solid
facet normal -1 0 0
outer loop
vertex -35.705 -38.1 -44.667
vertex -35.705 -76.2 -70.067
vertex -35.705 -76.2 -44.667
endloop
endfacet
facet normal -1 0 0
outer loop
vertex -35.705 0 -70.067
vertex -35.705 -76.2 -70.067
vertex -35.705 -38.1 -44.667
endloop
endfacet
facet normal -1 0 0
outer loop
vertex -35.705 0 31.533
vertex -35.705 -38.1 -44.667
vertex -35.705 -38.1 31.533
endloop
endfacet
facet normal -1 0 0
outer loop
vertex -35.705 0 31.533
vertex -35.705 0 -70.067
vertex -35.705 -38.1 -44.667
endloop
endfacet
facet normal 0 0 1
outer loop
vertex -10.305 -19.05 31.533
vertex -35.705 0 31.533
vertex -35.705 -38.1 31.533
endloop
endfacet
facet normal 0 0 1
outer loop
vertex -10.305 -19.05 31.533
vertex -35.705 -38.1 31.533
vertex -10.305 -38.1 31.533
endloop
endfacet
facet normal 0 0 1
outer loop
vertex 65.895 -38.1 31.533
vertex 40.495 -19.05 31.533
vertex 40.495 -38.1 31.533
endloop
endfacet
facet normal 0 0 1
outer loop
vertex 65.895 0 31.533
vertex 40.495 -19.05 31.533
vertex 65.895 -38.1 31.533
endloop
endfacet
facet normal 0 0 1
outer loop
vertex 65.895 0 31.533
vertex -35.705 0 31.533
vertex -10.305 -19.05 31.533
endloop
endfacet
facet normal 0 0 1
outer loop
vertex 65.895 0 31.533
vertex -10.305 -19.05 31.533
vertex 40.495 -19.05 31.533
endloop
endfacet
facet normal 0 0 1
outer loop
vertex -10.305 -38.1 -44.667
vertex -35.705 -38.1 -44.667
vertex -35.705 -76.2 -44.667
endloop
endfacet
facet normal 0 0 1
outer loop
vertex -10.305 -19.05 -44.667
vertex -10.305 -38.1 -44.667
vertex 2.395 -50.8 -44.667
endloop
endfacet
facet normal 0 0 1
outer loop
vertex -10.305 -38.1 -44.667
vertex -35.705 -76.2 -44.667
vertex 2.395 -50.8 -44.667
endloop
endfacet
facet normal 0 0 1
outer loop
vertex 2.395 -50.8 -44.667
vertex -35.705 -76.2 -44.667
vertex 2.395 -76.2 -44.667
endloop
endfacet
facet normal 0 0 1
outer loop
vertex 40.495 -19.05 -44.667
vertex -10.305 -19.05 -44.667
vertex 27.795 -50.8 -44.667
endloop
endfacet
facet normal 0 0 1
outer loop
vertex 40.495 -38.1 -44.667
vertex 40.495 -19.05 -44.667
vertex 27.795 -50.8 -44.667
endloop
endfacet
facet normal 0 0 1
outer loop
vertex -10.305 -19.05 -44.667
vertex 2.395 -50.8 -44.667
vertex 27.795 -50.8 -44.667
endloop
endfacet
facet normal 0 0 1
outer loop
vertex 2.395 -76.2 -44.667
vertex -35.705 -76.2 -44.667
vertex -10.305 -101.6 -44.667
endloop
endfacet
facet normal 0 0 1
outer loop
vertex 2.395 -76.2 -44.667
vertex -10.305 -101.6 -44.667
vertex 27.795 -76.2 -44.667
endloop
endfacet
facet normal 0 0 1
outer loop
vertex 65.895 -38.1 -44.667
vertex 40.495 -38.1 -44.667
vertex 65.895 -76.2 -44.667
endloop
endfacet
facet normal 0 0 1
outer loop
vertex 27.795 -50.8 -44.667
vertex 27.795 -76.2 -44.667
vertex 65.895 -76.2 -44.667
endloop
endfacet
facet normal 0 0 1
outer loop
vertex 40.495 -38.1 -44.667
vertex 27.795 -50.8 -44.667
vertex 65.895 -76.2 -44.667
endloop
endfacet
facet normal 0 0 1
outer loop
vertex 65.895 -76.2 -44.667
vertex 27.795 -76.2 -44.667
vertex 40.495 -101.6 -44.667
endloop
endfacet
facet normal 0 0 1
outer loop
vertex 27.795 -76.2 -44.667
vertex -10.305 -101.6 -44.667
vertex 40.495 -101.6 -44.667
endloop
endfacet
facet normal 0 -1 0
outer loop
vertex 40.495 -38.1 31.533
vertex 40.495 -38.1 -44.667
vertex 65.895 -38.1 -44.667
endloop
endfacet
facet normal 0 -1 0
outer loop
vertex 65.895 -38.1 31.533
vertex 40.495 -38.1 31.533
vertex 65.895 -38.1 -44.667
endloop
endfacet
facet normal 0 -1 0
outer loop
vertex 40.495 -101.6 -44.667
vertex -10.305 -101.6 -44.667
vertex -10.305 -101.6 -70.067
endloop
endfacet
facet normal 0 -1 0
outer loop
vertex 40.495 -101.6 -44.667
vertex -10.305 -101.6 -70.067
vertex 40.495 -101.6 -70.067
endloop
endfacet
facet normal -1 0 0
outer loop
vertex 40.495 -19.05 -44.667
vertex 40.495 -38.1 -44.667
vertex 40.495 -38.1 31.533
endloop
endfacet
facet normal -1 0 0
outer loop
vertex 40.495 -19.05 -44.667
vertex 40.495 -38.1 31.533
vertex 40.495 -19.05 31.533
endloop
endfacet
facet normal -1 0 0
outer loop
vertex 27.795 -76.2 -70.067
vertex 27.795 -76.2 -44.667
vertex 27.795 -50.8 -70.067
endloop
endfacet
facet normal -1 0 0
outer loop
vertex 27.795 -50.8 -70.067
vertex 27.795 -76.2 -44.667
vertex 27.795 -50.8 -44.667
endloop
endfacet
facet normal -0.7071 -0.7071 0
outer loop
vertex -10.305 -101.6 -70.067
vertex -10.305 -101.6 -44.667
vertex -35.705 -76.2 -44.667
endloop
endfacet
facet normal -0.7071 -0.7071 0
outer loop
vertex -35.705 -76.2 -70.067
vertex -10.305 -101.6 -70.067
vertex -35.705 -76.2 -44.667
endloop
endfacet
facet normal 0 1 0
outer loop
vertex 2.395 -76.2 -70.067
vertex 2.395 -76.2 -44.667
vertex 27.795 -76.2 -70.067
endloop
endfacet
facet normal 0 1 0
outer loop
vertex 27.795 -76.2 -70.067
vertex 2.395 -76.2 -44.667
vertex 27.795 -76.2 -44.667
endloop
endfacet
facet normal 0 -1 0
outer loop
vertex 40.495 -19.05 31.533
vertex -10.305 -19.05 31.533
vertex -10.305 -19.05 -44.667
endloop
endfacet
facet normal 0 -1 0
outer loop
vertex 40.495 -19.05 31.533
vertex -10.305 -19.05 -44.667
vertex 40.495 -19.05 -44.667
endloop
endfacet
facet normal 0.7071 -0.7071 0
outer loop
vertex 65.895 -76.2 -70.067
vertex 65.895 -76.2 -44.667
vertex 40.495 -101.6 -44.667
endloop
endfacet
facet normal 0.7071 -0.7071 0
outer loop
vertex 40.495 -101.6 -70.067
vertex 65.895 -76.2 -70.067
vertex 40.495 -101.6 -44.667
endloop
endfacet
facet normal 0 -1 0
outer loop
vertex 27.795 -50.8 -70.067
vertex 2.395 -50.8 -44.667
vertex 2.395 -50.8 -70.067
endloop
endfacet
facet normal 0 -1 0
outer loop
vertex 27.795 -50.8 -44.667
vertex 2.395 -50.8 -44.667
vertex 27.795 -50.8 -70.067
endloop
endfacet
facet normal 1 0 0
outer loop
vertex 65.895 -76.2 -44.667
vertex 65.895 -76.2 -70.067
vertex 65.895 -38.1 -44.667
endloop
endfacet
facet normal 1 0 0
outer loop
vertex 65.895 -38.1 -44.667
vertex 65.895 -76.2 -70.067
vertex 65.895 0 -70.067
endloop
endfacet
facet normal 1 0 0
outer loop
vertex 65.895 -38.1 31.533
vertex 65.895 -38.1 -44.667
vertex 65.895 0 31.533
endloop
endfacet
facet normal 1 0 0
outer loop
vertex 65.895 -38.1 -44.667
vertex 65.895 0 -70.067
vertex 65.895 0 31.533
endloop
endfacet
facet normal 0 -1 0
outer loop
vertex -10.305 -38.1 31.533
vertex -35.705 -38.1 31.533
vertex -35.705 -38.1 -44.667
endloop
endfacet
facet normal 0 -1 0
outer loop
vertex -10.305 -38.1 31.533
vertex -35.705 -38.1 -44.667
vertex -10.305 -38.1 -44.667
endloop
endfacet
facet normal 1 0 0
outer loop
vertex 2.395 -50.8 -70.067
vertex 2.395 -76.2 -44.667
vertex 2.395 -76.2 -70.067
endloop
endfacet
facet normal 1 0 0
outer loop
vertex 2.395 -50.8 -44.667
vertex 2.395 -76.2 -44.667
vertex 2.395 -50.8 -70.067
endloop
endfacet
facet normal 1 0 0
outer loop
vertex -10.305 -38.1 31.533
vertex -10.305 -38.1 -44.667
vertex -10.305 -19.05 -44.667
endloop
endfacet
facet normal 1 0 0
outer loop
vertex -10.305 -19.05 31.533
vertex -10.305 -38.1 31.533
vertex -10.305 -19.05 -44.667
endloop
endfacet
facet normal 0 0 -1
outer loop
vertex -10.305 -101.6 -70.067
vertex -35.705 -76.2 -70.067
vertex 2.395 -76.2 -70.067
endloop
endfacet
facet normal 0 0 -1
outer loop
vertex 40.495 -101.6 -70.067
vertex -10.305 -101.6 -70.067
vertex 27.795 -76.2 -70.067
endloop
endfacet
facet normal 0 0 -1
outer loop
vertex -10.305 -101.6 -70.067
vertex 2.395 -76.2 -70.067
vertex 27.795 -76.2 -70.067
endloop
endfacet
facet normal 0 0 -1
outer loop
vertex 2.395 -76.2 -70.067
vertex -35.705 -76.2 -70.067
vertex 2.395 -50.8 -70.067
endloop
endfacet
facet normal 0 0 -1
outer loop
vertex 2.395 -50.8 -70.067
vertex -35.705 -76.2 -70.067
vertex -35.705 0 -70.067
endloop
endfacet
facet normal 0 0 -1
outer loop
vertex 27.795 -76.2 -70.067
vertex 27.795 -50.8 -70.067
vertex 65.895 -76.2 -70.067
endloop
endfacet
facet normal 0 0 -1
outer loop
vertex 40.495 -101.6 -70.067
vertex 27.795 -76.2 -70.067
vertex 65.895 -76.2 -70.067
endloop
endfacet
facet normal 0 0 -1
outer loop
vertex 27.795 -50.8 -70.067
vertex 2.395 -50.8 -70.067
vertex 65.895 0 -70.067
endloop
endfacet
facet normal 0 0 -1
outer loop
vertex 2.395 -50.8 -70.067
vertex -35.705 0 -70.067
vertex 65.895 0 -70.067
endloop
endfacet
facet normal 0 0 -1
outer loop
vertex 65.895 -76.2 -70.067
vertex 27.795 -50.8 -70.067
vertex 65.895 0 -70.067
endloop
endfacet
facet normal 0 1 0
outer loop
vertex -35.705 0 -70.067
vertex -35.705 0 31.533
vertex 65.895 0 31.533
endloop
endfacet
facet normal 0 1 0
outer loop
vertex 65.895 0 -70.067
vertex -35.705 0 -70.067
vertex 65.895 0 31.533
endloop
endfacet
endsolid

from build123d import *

# Parameters (mm, degrees)
F0_W     = 101.6
F0_H     = 101.6
F1_DEPTH = 101.6
F2_W     = 101.6
F2_H     = 76.2
F3_DEPTH = 63.5
F4_W     = 50.8
F4_H     = 19.05
F5_DEPTH = 76.2
F7_DEPTH = 25.4
F8_W     = 25.4
F8_H     = 25.4
F9_DEPTH = 25.4


with BuildPart() as f1:
    # F0 (on Front) → F1 (new body)
    with BuildSketch(Plane.XZ):
        with Locations((15.095475, -19.266974)):
            Rectangle(F0_W, F0_H)
    extrude(amount=F1_DEPTH)

    # F2 (on face) → F3 (cut)
    with BuildSketch(Plane.XZ.offset(101.6)):
        with Locations((15.095475, -6.566974)):
            Rectangle(F2_W, F2_H)
    extrude(amount=-F3_DEPTH, mode=Mode.SUBTRACT)

    # F4 (on face) → F5 (cut)
    with BuildSketch(Plane.XY.offset(31.533026)):
        with Locations((15.095475, -28.575)):
            Rectangle(F4_W, F4_H)
    extrude(amount=-F5_DEPTH, mode=Mode.SUBTRACT)

    # F6 (on face) → F7 (cut)
    with BuildSketch(Plane.XY.offset(-44.666974)):
        Polygon((-35.704525, -76.2), (-35.704525, -101.6), (-10.304525, -101.6), align=None)
        Polygon((65.895475, -76.2), (40.495475, -101.6), (65.895475, -101.6), align=None)
    extrude(amount=-F7_DEPTH, mode=Mode.SUBTRACT)

    # F8 (on face) → F9 (cut)
    with BuildSketch(Plane.XY.offset(-44.666974)):
        with Locations((15.095475, -63.5)):
            Rectangle(F8_W, F8_H)
    extrude(amount=-F9_DEPTH, mode=Mode.SUBTRACT)


solid = f1.part
